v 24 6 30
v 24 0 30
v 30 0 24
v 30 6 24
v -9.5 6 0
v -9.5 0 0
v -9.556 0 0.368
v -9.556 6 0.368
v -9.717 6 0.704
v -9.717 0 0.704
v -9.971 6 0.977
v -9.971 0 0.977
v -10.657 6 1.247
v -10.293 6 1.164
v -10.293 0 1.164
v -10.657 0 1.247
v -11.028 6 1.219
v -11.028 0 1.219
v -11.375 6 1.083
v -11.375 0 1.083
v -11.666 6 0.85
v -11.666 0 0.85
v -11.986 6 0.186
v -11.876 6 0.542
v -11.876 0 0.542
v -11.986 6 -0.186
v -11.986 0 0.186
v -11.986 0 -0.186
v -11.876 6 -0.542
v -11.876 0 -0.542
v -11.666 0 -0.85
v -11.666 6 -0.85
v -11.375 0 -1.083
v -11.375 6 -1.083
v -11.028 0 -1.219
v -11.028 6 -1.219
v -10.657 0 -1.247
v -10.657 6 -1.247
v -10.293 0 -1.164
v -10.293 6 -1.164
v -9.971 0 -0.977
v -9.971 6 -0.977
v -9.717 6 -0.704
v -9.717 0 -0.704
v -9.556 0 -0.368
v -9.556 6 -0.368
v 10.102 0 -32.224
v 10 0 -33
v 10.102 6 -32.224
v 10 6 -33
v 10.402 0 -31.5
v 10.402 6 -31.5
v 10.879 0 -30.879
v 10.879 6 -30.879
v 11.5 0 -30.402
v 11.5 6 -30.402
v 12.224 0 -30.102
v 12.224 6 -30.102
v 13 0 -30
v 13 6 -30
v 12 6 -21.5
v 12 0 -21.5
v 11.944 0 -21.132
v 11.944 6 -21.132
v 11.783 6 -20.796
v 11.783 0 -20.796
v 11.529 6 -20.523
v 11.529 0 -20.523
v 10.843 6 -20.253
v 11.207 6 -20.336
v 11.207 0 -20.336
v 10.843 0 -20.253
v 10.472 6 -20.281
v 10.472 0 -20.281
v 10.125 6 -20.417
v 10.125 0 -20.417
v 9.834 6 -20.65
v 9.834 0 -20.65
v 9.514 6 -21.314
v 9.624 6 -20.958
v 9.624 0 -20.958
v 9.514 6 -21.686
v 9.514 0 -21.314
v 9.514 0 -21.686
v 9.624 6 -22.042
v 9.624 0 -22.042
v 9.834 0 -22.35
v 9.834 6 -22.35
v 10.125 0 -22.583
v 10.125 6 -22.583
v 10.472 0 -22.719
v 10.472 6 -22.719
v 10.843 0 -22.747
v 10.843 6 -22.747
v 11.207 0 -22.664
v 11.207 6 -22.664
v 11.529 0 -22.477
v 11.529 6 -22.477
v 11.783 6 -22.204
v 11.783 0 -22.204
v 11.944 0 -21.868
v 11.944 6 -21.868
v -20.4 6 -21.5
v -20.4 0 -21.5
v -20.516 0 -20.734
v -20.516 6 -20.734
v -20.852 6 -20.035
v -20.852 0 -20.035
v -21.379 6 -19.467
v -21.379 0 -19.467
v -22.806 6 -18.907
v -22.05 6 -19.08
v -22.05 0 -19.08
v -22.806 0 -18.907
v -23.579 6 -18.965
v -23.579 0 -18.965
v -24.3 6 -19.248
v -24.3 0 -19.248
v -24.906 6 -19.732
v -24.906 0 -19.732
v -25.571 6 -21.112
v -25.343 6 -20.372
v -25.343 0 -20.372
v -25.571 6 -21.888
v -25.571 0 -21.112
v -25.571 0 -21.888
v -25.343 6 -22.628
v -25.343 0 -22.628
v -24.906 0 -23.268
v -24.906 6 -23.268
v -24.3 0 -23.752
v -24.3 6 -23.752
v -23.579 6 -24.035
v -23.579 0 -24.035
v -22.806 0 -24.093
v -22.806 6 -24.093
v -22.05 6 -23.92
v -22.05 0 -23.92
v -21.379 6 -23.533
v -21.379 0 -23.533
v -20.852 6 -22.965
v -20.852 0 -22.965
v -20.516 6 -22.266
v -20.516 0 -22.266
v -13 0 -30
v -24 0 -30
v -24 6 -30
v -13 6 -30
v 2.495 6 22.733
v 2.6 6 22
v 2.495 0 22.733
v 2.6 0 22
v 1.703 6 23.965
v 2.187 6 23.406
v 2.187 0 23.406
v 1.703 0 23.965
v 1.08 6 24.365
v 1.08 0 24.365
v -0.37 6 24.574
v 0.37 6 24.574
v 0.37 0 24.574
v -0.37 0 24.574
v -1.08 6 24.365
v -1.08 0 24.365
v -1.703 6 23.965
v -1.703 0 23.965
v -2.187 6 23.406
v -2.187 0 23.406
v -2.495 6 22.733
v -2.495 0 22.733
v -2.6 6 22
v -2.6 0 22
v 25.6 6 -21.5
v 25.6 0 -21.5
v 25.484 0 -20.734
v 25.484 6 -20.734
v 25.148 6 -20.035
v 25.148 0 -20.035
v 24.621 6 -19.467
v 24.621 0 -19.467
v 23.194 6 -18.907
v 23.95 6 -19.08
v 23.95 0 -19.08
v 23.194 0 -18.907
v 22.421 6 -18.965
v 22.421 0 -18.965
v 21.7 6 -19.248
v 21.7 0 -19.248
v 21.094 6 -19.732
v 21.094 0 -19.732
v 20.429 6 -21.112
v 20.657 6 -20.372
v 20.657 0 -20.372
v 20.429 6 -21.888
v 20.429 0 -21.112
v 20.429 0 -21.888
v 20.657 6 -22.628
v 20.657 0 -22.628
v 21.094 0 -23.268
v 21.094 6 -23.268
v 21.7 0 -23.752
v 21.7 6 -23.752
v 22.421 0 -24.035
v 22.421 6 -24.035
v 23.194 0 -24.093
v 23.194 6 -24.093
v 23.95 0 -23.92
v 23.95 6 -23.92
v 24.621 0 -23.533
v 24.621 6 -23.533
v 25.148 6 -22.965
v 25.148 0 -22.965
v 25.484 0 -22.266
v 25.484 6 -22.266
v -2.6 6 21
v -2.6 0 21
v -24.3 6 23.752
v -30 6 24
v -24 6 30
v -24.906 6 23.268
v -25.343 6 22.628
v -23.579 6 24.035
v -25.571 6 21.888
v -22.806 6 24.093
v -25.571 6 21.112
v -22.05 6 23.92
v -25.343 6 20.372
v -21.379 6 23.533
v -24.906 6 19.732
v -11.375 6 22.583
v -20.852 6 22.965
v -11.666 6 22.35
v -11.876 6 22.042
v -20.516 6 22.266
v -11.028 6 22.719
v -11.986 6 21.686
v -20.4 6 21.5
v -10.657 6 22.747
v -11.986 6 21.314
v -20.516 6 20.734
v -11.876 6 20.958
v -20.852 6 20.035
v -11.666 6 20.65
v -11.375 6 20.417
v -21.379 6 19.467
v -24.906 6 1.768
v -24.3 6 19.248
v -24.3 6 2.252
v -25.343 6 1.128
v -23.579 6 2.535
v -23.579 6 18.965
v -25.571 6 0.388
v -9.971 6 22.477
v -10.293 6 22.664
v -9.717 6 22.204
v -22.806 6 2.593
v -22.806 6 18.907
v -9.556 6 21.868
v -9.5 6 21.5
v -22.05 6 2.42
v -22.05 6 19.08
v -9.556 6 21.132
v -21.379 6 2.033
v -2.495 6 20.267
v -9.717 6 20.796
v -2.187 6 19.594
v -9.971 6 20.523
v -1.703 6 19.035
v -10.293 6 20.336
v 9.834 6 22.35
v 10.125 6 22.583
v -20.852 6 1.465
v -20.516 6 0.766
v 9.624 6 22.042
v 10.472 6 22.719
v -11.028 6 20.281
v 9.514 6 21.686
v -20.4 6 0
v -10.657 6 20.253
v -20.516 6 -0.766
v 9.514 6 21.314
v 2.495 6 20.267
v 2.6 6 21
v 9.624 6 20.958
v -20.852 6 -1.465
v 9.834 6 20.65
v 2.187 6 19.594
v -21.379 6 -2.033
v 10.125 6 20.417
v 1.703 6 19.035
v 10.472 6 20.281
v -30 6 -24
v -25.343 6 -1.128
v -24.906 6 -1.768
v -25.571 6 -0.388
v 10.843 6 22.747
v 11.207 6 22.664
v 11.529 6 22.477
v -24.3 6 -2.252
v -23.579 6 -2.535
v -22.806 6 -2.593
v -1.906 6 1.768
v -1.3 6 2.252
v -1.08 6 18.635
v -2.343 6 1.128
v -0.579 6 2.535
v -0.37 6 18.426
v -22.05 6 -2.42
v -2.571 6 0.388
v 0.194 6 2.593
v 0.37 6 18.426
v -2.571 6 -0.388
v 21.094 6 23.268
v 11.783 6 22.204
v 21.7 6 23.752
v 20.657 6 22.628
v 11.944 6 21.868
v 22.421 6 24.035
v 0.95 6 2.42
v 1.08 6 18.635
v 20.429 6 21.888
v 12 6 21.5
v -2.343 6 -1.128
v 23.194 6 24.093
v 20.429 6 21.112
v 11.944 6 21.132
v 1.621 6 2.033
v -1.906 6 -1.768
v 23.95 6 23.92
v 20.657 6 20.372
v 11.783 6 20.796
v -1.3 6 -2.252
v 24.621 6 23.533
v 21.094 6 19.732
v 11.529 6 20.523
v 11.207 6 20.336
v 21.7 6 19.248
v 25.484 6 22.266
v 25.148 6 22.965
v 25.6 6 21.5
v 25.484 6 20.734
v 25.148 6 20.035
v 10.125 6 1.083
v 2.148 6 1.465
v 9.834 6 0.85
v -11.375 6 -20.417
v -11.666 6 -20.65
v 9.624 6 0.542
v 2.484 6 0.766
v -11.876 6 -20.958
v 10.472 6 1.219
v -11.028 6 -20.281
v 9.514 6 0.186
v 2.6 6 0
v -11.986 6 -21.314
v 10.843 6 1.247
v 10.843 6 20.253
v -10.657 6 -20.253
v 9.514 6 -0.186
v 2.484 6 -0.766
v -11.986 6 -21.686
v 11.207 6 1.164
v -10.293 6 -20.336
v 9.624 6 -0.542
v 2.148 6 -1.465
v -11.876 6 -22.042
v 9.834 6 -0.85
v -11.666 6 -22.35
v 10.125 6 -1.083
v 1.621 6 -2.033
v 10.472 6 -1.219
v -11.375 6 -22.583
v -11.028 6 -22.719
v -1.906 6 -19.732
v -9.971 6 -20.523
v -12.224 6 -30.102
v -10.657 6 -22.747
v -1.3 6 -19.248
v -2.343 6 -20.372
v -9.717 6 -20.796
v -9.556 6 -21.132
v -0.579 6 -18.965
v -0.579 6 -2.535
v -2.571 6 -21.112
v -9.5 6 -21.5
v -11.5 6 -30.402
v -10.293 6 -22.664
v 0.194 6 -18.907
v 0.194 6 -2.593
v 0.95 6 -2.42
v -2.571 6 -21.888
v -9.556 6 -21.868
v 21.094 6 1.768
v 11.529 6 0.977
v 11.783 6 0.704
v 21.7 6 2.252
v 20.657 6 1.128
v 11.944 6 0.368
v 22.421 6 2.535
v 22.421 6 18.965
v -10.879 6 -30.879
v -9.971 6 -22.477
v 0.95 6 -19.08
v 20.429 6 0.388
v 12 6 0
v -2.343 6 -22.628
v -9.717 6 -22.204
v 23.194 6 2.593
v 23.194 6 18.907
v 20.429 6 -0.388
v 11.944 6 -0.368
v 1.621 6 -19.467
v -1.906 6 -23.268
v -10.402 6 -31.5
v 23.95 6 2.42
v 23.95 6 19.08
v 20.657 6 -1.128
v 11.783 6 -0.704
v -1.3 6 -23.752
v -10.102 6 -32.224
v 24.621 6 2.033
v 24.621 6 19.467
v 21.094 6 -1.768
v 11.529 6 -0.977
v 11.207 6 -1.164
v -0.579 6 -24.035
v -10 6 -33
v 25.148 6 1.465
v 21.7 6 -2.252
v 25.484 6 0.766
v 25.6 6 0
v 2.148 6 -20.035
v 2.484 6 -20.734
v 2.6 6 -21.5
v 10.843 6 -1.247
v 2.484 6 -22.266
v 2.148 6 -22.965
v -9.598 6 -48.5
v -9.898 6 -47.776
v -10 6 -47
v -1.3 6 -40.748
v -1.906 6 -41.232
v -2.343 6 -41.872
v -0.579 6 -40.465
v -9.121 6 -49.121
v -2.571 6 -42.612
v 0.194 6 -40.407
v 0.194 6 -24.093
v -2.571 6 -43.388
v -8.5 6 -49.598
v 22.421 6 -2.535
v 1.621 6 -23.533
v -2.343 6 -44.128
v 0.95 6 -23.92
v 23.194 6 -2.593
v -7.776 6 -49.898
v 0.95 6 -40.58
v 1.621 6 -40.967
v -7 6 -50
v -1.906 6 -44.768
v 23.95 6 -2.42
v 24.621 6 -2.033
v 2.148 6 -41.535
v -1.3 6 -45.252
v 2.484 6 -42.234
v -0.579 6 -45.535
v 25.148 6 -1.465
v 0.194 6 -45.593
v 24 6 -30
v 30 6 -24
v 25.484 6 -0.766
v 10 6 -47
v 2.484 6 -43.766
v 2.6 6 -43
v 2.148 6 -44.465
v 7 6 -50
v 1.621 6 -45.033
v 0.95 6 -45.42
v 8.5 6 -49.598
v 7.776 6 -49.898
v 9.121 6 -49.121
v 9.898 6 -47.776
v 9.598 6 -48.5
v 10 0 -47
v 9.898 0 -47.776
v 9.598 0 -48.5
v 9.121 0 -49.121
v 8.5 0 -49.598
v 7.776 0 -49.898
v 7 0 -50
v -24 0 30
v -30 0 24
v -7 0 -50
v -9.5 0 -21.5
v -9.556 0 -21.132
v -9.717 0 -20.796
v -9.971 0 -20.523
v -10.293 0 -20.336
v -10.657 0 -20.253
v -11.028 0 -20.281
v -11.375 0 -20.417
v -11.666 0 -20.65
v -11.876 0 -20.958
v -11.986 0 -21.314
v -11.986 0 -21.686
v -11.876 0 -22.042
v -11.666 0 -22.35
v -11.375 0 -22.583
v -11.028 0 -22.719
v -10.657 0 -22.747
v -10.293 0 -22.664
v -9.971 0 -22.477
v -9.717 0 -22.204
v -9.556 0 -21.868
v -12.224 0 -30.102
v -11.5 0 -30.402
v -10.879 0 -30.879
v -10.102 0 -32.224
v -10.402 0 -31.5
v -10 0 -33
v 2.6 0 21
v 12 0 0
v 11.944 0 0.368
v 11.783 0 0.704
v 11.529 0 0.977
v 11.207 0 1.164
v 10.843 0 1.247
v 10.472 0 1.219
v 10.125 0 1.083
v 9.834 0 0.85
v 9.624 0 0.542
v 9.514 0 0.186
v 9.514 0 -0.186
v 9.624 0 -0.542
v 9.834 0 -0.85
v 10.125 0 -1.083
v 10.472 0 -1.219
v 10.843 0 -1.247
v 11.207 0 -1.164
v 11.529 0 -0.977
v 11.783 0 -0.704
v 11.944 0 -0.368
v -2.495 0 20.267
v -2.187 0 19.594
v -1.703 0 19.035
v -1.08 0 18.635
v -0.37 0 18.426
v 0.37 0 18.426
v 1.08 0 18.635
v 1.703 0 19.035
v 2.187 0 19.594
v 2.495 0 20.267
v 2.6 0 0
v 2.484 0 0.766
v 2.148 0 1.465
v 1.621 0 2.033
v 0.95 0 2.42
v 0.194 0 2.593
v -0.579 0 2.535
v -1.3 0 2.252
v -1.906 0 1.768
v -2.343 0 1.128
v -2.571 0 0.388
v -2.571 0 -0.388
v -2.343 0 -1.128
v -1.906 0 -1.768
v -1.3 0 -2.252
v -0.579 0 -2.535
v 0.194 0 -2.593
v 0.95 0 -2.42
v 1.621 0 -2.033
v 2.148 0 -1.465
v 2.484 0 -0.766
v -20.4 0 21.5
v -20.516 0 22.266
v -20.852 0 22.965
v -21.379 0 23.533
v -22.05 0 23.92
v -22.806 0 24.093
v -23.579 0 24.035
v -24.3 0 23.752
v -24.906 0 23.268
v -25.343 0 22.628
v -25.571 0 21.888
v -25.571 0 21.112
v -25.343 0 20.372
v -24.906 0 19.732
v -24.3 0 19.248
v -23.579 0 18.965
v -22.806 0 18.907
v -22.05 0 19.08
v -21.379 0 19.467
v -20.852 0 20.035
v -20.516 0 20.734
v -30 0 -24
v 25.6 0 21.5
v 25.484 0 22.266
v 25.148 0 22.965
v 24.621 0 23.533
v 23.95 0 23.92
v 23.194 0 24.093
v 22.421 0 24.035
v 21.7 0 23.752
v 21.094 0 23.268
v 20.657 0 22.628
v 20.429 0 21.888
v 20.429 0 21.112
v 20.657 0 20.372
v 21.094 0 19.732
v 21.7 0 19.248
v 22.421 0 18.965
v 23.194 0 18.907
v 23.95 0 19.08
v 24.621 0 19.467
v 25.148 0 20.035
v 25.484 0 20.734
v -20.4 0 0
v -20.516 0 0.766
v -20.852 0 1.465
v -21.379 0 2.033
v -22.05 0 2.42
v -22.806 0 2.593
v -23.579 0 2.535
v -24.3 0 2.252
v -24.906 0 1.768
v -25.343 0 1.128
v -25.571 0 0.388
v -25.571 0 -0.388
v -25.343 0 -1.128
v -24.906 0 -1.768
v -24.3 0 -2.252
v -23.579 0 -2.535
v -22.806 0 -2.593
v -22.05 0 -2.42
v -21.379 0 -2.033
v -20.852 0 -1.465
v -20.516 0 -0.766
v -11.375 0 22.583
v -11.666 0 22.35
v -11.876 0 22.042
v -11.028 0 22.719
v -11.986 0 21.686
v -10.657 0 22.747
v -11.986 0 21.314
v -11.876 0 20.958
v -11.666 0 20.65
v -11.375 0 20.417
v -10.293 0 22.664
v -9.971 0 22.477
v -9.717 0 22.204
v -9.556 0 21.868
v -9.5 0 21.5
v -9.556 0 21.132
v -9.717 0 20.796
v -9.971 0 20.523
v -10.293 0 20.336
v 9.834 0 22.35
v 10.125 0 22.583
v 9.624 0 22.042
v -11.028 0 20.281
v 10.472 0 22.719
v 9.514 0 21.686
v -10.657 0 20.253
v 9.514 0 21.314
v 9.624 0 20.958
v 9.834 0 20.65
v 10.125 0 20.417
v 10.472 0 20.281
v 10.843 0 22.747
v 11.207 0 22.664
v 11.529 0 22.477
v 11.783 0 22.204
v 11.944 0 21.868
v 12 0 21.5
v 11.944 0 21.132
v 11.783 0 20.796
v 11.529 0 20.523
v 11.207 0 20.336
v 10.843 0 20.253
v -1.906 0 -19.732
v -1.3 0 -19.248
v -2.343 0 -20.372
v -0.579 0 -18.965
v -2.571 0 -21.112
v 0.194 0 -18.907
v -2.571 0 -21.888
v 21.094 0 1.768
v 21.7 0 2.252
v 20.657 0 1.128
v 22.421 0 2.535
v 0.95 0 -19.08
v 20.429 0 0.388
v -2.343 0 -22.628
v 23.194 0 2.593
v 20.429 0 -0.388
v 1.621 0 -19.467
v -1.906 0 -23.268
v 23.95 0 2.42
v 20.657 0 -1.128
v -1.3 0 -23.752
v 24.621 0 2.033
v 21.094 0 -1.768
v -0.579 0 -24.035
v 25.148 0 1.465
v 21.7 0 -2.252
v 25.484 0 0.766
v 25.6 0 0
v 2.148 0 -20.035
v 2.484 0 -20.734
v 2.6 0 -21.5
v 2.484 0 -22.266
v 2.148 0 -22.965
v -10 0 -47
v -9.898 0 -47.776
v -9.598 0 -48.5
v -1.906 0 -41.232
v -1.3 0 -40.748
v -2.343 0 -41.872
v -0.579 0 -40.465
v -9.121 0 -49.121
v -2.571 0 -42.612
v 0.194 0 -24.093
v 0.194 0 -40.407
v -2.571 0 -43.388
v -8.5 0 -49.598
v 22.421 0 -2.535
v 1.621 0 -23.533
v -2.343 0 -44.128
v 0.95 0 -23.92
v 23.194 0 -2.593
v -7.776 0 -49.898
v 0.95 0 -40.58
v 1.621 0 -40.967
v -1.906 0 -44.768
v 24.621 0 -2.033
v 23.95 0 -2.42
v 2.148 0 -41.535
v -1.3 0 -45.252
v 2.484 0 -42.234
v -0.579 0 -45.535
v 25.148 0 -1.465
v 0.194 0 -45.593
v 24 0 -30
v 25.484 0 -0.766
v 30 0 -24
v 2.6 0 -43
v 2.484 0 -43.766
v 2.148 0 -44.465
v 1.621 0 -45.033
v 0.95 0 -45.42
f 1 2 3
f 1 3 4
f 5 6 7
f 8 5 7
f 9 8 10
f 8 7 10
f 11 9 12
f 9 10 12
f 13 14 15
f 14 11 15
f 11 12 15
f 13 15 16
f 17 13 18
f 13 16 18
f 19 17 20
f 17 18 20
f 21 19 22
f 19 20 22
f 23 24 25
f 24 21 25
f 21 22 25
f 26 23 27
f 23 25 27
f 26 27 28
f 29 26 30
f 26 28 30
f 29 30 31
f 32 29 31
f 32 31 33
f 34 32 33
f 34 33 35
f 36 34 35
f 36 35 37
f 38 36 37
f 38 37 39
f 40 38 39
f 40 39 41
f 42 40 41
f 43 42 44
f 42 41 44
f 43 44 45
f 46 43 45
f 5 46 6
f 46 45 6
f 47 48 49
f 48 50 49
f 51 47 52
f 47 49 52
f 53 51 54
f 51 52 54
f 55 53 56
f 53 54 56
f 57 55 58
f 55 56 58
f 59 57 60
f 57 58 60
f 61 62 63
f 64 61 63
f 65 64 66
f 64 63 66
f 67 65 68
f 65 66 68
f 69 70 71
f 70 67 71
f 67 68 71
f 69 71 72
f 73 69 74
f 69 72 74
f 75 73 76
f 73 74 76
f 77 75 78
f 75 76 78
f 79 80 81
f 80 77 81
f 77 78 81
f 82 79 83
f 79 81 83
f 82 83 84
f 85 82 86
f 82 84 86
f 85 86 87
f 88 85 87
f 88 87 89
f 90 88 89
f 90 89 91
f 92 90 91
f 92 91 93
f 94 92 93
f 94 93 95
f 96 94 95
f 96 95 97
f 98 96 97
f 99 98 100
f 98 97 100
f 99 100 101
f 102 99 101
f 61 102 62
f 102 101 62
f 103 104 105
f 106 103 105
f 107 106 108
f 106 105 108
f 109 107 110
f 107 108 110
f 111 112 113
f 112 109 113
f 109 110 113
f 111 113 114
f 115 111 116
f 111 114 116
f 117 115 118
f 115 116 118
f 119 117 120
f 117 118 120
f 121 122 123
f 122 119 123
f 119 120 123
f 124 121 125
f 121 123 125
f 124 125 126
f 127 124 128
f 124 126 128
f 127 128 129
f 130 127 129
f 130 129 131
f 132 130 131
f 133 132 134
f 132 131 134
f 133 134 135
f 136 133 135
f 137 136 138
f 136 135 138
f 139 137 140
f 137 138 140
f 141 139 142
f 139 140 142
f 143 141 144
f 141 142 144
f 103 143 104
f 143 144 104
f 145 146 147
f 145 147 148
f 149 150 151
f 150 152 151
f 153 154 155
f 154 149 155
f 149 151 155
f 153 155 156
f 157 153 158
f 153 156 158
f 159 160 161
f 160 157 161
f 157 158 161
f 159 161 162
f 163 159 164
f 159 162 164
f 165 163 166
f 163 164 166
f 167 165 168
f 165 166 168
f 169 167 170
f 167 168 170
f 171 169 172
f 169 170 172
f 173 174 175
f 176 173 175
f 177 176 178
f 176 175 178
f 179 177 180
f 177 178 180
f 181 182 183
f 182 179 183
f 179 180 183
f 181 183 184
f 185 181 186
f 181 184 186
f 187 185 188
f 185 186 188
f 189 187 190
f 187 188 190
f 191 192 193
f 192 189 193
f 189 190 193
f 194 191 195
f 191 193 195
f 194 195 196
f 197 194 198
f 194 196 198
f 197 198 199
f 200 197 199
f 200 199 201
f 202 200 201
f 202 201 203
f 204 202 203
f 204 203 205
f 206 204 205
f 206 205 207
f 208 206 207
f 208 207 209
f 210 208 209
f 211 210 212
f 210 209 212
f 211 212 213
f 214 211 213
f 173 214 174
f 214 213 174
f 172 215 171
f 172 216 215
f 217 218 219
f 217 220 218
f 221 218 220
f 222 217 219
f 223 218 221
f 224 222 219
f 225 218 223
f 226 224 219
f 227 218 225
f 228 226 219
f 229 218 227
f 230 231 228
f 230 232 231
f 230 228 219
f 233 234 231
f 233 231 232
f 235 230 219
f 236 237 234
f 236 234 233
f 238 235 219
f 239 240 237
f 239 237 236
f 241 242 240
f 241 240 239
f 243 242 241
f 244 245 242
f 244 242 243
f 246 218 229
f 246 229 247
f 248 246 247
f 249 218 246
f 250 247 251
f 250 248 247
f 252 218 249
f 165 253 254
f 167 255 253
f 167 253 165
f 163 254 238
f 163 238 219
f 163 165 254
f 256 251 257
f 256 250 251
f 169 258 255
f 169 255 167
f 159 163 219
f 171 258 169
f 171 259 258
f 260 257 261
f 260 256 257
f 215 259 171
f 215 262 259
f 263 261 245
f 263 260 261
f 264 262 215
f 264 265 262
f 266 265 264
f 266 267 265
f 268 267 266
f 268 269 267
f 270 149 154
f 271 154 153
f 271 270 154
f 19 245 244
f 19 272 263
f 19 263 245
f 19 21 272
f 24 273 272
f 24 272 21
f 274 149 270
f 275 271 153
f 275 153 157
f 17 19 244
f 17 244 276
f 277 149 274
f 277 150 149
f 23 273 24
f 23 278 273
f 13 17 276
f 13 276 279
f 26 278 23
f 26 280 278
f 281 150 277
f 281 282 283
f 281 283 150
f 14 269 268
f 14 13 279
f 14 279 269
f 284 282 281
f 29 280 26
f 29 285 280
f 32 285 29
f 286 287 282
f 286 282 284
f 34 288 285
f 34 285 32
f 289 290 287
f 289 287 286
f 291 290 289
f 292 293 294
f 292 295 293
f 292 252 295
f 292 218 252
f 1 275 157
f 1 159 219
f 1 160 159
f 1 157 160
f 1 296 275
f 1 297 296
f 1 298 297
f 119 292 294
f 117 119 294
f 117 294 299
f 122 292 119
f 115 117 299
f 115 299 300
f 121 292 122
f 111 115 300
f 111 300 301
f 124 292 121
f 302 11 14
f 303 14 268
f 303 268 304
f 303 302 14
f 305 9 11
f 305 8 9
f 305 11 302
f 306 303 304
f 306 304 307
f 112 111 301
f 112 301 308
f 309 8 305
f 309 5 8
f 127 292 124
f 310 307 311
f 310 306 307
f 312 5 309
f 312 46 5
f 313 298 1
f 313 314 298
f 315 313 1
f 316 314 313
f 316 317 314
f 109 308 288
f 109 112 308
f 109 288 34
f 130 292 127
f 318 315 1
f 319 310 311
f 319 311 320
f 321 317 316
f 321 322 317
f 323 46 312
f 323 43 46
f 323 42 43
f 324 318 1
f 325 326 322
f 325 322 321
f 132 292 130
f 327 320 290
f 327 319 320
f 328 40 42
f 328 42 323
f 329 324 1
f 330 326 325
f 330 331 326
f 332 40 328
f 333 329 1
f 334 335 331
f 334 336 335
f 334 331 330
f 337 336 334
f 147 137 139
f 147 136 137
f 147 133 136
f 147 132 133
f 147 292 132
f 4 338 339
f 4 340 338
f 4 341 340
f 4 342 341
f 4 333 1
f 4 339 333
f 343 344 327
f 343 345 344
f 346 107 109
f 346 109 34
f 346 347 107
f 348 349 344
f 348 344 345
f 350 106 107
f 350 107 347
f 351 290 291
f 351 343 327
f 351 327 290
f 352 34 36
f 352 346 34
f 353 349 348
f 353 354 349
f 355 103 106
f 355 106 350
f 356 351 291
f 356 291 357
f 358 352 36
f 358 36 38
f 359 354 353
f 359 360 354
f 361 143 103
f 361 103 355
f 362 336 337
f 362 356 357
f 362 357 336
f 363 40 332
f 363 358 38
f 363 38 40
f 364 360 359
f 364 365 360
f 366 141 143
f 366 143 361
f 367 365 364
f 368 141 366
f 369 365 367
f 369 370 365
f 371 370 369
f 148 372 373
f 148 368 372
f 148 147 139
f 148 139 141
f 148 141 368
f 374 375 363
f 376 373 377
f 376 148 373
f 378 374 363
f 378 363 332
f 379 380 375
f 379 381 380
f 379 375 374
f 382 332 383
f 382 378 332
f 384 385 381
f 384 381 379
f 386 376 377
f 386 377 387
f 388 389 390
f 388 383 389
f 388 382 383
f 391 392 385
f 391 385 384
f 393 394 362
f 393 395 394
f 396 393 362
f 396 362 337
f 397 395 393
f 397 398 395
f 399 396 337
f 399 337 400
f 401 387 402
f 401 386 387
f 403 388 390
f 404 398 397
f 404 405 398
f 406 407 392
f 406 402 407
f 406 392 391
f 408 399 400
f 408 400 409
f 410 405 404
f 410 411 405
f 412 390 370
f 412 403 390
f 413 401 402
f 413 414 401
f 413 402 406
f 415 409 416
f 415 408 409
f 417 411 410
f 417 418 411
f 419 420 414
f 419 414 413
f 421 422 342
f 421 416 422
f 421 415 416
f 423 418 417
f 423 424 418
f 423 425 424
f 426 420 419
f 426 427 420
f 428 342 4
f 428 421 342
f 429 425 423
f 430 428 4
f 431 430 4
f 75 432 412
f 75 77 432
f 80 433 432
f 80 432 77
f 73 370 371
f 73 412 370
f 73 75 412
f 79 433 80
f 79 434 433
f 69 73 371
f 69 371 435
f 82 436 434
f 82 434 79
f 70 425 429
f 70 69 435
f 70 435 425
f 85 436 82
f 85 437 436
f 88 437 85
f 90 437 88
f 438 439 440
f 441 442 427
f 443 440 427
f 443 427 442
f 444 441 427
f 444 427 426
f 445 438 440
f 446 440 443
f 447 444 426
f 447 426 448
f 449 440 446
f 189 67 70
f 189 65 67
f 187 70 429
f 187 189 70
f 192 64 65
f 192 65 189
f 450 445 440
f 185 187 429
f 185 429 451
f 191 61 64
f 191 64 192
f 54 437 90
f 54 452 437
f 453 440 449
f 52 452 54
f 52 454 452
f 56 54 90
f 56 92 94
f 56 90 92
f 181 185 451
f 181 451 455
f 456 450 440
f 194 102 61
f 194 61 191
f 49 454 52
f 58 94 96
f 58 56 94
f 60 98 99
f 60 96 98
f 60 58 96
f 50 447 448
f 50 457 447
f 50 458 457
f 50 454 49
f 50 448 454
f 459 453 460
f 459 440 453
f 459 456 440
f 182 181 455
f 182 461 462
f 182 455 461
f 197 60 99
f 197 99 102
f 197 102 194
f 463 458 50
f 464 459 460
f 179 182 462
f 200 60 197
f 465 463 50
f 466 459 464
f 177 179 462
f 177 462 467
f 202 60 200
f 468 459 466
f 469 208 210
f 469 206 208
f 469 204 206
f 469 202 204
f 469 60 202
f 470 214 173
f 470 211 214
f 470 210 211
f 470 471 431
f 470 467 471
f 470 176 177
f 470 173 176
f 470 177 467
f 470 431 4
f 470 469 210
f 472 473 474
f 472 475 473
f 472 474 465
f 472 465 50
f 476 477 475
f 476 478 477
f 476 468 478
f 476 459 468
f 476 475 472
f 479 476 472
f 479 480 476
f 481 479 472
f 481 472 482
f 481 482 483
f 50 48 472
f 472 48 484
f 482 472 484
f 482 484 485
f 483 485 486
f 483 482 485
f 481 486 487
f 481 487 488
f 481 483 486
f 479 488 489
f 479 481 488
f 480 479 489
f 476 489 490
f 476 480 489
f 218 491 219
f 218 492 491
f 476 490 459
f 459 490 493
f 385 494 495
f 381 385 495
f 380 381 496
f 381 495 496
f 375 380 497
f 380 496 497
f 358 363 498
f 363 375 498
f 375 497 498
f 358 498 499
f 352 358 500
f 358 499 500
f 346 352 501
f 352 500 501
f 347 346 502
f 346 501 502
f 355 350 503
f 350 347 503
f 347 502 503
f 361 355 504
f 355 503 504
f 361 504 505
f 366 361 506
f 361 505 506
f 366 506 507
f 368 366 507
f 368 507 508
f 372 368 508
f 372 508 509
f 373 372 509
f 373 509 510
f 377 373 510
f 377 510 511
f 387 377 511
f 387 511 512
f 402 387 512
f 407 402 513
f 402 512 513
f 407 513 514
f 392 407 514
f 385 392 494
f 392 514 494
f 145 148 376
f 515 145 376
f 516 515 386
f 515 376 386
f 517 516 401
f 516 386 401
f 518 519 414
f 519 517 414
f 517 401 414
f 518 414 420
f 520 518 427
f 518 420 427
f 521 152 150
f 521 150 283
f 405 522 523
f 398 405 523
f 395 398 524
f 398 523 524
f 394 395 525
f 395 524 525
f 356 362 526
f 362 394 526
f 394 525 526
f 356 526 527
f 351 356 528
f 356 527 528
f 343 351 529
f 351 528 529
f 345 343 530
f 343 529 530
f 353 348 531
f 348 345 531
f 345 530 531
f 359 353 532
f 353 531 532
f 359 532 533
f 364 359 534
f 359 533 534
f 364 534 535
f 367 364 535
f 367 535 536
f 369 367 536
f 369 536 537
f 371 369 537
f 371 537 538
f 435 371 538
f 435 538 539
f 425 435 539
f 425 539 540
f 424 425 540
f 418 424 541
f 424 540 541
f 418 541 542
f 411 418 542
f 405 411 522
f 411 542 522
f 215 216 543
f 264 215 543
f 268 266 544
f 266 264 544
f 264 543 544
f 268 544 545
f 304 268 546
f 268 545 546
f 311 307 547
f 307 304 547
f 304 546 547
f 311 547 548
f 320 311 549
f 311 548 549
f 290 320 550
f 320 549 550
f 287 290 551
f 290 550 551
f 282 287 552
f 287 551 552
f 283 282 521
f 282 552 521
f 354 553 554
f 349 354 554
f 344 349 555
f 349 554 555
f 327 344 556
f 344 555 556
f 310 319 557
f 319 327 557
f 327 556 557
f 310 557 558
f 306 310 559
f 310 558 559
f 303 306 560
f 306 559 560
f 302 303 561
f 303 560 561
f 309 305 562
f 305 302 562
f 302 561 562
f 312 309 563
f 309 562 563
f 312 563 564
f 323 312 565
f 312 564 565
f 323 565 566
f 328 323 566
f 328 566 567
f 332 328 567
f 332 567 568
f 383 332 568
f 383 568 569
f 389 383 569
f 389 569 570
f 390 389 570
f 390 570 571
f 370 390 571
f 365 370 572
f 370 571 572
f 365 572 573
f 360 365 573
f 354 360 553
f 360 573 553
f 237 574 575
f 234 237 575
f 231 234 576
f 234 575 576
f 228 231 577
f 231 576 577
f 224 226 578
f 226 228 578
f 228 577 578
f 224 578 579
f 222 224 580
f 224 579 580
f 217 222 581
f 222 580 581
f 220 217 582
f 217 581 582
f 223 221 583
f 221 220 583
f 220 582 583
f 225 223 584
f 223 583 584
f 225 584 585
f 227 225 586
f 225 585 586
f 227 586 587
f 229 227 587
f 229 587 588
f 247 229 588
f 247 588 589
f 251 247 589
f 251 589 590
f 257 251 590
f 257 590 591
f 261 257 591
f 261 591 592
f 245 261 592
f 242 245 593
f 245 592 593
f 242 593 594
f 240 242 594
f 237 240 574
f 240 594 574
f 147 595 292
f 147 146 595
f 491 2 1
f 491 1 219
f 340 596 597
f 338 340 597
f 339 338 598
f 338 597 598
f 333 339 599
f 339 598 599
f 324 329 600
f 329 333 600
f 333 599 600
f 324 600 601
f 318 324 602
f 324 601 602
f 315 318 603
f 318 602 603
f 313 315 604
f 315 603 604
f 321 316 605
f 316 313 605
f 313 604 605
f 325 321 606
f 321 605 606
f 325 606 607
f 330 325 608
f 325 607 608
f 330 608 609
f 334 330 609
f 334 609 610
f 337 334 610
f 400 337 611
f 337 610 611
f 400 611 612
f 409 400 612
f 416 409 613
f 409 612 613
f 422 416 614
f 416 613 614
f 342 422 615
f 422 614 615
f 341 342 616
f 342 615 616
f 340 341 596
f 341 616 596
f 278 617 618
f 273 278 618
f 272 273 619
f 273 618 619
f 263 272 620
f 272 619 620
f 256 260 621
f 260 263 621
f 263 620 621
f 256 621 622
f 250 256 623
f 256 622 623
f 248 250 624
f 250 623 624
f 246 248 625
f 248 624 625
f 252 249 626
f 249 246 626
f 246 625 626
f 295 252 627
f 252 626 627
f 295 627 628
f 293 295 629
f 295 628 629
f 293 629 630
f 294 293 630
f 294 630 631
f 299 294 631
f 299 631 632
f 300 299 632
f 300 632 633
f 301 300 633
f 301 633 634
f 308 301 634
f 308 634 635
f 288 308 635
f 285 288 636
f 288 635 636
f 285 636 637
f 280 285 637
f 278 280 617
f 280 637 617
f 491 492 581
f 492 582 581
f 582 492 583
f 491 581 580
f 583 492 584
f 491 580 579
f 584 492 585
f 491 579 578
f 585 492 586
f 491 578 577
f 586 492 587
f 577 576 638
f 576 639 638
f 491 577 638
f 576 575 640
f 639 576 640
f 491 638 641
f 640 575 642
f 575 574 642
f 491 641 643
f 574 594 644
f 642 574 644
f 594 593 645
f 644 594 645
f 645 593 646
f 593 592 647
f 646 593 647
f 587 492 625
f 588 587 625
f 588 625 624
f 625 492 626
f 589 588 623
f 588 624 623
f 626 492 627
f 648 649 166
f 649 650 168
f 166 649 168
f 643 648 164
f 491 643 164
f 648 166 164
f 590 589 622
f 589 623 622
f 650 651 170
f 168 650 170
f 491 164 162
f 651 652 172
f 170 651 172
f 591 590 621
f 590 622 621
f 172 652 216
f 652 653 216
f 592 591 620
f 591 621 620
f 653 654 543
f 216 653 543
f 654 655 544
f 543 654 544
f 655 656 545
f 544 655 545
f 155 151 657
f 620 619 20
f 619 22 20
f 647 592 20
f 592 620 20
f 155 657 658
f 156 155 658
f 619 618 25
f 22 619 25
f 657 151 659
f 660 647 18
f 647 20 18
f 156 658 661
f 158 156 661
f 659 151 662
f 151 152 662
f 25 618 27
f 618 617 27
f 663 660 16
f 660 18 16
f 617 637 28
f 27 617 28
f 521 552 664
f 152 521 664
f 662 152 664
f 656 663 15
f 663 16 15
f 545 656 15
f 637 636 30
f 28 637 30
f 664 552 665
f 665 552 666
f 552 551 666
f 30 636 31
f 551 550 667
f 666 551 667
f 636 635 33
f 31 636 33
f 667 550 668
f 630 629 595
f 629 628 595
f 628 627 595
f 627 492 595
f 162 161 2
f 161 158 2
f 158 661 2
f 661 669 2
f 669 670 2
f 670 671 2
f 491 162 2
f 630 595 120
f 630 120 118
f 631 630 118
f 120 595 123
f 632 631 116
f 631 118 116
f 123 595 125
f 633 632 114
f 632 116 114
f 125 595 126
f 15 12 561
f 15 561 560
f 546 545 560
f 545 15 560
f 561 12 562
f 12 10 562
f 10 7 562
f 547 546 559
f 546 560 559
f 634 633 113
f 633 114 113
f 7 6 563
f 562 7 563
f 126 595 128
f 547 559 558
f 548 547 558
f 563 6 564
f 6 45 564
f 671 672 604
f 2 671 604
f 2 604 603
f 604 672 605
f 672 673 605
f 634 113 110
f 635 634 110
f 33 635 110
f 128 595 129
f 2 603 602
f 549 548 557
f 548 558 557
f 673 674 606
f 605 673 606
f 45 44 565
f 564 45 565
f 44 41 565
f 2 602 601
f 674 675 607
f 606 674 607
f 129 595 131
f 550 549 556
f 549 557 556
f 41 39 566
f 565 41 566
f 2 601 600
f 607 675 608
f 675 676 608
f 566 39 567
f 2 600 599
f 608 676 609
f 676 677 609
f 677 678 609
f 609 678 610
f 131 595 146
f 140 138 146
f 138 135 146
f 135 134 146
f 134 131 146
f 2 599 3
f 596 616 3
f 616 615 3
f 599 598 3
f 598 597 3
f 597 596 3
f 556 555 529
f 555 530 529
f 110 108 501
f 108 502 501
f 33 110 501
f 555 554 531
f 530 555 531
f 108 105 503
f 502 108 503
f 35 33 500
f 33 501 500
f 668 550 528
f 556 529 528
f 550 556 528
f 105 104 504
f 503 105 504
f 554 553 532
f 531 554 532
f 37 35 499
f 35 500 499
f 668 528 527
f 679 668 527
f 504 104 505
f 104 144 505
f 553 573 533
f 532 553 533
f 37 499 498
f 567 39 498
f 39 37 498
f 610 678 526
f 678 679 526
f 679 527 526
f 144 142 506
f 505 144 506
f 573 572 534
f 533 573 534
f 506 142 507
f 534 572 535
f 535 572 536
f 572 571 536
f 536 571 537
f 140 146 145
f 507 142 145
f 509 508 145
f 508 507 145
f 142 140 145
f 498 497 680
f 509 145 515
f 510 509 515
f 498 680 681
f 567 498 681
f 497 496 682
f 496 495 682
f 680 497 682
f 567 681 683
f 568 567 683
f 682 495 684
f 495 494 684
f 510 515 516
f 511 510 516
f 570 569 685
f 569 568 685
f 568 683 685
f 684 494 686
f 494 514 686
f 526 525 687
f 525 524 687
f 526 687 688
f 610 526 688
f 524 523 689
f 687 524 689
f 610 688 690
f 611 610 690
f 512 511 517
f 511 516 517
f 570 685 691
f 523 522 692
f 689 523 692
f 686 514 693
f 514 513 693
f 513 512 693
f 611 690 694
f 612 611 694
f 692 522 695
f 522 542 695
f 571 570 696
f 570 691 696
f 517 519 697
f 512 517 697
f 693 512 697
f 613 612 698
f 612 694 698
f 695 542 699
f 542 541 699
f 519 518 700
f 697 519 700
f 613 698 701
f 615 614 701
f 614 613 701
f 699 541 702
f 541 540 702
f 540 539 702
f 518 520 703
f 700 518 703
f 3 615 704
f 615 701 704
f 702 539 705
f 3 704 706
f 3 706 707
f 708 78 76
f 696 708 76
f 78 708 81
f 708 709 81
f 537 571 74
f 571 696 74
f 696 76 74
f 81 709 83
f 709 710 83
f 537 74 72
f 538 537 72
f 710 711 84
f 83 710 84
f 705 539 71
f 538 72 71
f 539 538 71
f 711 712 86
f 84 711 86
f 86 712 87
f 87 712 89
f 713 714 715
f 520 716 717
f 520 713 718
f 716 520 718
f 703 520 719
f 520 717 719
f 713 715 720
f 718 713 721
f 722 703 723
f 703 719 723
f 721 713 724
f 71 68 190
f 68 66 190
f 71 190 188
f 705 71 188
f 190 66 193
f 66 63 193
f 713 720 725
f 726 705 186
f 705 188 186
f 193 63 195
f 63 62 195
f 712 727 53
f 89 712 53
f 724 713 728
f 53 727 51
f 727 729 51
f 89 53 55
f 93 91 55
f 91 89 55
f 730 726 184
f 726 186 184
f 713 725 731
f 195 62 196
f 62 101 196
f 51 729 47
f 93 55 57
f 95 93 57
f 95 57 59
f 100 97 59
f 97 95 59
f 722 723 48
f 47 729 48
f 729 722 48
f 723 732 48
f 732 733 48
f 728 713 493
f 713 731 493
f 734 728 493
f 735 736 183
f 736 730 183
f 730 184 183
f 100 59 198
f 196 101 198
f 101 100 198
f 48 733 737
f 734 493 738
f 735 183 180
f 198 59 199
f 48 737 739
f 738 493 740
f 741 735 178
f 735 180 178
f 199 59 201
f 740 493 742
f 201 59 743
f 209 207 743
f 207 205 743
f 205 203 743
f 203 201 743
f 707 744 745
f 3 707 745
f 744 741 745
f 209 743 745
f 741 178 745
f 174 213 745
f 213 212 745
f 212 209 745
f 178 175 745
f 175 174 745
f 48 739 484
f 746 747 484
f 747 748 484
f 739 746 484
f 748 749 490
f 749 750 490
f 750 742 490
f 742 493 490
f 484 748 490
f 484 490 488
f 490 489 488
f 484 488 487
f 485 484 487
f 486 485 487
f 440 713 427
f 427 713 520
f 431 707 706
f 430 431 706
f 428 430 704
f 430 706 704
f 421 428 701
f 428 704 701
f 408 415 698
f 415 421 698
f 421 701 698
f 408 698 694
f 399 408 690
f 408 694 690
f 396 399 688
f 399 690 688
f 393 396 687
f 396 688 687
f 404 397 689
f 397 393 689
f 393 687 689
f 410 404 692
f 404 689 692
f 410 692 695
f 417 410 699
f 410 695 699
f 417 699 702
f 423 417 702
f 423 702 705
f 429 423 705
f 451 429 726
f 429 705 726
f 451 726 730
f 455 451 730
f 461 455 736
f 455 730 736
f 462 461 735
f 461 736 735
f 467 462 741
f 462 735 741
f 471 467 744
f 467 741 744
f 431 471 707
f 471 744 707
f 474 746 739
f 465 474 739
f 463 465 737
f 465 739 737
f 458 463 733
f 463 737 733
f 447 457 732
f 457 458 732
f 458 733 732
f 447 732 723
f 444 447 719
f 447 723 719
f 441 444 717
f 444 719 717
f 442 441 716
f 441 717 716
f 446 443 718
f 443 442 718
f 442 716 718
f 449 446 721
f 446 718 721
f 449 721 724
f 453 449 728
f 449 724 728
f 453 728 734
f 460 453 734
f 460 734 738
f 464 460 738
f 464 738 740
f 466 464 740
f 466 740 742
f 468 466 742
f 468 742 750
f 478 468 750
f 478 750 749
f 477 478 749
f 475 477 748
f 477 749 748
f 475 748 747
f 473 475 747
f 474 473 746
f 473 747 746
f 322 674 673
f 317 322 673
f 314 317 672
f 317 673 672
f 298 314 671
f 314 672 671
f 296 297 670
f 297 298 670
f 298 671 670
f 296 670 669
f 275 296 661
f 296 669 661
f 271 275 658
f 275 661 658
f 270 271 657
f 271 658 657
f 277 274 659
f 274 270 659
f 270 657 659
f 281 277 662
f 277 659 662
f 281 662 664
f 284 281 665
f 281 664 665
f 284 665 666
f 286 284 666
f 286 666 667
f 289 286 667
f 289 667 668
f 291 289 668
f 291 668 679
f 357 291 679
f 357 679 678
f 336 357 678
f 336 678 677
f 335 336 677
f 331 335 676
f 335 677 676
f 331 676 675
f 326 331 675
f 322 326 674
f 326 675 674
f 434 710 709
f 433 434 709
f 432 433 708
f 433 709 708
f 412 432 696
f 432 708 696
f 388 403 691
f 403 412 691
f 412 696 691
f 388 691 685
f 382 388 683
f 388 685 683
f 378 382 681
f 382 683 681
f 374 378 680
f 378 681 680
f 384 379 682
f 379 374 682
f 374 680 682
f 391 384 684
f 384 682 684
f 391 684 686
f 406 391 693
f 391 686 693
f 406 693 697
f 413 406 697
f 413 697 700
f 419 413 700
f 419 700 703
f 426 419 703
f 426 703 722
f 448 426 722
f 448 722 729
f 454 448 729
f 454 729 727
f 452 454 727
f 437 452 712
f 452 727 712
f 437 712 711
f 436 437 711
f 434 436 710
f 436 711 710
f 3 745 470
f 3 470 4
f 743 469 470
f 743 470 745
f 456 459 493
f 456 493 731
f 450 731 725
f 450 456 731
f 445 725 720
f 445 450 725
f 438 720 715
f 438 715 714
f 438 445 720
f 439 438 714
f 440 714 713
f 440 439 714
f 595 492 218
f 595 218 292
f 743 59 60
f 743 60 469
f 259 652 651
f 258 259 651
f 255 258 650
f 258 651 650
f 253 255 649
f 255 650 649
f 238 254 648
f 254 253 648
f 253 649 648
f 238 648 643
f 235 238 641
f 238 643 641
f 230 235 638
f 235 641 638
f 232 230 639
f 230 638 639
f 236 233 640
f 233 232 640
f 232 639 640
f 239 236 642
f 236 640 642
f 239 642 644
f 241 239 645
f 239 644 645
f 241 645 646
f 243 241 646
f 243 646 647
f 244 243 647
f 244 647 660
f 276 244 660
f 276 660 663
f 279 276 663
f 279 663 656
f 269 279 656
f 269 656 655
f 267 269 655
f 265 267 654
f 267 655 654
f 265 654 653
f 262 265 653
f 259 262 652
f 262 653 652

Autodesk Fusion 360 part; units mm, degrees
sketch "Sketch1" plane through (0, 0, 0) normal (0, 1, 0) x (1, 0, 0)
  line L0 (30, 30) -> (30, -30)
  line L1 (30, -30) -> (-30, -30)
  line L2 (-30, -30) -> (-30, 30)
  line L3 (-30, 30) -> (30, -30) construction
  line L4 (30, 30) -> (-30, -30) construction
  line L5 (10, 30) -> (10, 50)
  line L6 (10, 50) -> (-10, 50)
  line L7 (-10, 50) -> (-10, 30)
  line L8 (-30, 30) -> (-10, 30)
  line L9 (10, 30) -> (30, 30)
  circle A0 centre (0, 43) radius 2.6
  line L10 (-30, 0) -> (30, 0) construction
  circle A1 centre (0, 21.5) radius 2.6
  circle A2 centre (-23, 21.5) radius 2.6
  circle A3 centre (23, 21.5) radius 2.6
  circle A4 centre (-10.75, 21.5) radius 1.25
  circle A5 centre (10.75, 21.5) radius 1.25
  circle A6 centre (-23, 0) radius 2.6
  circle A7 centre (-10.75, 0) radius 1.25
  circle A8 centre (0, 0) radius 2.6
  circle A9 centre (10.75, 0) radius 1.25
  circle A10 centre (23, 0) radius 2.6
  circle A11 centre (-23, -21.5) radius 2.6
  circle A12 centre (-10.75, -21.5) radius 1.25
  circle A13 centre (10.75, -21.5) radius 1.25
  circle A14 centre (23, -21.5) radius 2.6
  line L11 (-2.6, -21) -> (-2.6, -22)
  arc A15 (-2.6, -22) -> (2.6, -22) centre (0, -22) ccw
  line L12 (2.6, -22) -> (2.6, -21)
  arc A16 (2.6, -21) -> (-2.6, -21) centre (0, -21) ccw
  point P0 (0, -21.5)
  dimension "d4" = 60
  dimension "d5" = 60
  dimension "d7" = 20
  dimension "d8" = 20
  dimension "d9" = 5.2
  dimension "d10" = 7
  dimension "d11" = 5.2
  dimension "d12" = 21.5
  dimension "d13" = 5.2
  dimension "d14" = 5.2
  dimension "d15" = 23
  dimension "d16" = 23
  dimension "d17" = 2.5
  dimension "d18" = 2.5
  dimension "d19" = 10.75
  dimension "d20" = 10.75
  dimension "d24" = 21.5
  dimension "d25" = 0
  dimension "d28" = 5.2
  dimension "d29" = 0.5
extrude "Extrude1" add sketch "Sketch1" along normal blind 6
chamfer "Chamfer1" distance 6 angle 45 4 edges at (30, 3, 30) (30, 3, -30) (-30, 3, 30) (-30, 3, -30)
fillet "Fillet1" radius 3 2 edges at (10, 3, -50) (-10, 3, -50)
fillet "Fillet2" radius 3 2 edges at (10, 3, -30) (-10, 3, -30)
equation "larger_hole_radii = 2.6 mm"
equation "small_hole_Radii = 1.25 mm"
equation "base_sqaure_dim = 60 mm"
equation "d4 = base_sqaure_dim"
equation "d5 = base_sqaure_dim"
equation "square_extension = 20 mm"
equation "d7 = square_extension"
equation "d8 = square_extension"
equation "d9 = larger_hole_radii * 2"
equation "d11 = larger_hole_radii * 2"
equation "d13 = 2 * larger_hole_radii"
equation "d14 = 2 * larger_hole_radii"
equation "d17 = small_hole_Radii * 2"
equation "d18 = small_hole_Radii * 2"
equation "dist_between_Rows = 21.50 mm"
equation "slot_height = 5.20 mm"
equation "slot_width = 0.50 mm"
equation "d28 = slot_height"
equation "d29 = slot_width"
equation "ext = 6.0 mm"
equation "d31 = ext"
equation "d33 = ext"
equation "fillet_top = 3 mm"
equation "d36 = fillet_top"
equation "d38 = fillet_top"
